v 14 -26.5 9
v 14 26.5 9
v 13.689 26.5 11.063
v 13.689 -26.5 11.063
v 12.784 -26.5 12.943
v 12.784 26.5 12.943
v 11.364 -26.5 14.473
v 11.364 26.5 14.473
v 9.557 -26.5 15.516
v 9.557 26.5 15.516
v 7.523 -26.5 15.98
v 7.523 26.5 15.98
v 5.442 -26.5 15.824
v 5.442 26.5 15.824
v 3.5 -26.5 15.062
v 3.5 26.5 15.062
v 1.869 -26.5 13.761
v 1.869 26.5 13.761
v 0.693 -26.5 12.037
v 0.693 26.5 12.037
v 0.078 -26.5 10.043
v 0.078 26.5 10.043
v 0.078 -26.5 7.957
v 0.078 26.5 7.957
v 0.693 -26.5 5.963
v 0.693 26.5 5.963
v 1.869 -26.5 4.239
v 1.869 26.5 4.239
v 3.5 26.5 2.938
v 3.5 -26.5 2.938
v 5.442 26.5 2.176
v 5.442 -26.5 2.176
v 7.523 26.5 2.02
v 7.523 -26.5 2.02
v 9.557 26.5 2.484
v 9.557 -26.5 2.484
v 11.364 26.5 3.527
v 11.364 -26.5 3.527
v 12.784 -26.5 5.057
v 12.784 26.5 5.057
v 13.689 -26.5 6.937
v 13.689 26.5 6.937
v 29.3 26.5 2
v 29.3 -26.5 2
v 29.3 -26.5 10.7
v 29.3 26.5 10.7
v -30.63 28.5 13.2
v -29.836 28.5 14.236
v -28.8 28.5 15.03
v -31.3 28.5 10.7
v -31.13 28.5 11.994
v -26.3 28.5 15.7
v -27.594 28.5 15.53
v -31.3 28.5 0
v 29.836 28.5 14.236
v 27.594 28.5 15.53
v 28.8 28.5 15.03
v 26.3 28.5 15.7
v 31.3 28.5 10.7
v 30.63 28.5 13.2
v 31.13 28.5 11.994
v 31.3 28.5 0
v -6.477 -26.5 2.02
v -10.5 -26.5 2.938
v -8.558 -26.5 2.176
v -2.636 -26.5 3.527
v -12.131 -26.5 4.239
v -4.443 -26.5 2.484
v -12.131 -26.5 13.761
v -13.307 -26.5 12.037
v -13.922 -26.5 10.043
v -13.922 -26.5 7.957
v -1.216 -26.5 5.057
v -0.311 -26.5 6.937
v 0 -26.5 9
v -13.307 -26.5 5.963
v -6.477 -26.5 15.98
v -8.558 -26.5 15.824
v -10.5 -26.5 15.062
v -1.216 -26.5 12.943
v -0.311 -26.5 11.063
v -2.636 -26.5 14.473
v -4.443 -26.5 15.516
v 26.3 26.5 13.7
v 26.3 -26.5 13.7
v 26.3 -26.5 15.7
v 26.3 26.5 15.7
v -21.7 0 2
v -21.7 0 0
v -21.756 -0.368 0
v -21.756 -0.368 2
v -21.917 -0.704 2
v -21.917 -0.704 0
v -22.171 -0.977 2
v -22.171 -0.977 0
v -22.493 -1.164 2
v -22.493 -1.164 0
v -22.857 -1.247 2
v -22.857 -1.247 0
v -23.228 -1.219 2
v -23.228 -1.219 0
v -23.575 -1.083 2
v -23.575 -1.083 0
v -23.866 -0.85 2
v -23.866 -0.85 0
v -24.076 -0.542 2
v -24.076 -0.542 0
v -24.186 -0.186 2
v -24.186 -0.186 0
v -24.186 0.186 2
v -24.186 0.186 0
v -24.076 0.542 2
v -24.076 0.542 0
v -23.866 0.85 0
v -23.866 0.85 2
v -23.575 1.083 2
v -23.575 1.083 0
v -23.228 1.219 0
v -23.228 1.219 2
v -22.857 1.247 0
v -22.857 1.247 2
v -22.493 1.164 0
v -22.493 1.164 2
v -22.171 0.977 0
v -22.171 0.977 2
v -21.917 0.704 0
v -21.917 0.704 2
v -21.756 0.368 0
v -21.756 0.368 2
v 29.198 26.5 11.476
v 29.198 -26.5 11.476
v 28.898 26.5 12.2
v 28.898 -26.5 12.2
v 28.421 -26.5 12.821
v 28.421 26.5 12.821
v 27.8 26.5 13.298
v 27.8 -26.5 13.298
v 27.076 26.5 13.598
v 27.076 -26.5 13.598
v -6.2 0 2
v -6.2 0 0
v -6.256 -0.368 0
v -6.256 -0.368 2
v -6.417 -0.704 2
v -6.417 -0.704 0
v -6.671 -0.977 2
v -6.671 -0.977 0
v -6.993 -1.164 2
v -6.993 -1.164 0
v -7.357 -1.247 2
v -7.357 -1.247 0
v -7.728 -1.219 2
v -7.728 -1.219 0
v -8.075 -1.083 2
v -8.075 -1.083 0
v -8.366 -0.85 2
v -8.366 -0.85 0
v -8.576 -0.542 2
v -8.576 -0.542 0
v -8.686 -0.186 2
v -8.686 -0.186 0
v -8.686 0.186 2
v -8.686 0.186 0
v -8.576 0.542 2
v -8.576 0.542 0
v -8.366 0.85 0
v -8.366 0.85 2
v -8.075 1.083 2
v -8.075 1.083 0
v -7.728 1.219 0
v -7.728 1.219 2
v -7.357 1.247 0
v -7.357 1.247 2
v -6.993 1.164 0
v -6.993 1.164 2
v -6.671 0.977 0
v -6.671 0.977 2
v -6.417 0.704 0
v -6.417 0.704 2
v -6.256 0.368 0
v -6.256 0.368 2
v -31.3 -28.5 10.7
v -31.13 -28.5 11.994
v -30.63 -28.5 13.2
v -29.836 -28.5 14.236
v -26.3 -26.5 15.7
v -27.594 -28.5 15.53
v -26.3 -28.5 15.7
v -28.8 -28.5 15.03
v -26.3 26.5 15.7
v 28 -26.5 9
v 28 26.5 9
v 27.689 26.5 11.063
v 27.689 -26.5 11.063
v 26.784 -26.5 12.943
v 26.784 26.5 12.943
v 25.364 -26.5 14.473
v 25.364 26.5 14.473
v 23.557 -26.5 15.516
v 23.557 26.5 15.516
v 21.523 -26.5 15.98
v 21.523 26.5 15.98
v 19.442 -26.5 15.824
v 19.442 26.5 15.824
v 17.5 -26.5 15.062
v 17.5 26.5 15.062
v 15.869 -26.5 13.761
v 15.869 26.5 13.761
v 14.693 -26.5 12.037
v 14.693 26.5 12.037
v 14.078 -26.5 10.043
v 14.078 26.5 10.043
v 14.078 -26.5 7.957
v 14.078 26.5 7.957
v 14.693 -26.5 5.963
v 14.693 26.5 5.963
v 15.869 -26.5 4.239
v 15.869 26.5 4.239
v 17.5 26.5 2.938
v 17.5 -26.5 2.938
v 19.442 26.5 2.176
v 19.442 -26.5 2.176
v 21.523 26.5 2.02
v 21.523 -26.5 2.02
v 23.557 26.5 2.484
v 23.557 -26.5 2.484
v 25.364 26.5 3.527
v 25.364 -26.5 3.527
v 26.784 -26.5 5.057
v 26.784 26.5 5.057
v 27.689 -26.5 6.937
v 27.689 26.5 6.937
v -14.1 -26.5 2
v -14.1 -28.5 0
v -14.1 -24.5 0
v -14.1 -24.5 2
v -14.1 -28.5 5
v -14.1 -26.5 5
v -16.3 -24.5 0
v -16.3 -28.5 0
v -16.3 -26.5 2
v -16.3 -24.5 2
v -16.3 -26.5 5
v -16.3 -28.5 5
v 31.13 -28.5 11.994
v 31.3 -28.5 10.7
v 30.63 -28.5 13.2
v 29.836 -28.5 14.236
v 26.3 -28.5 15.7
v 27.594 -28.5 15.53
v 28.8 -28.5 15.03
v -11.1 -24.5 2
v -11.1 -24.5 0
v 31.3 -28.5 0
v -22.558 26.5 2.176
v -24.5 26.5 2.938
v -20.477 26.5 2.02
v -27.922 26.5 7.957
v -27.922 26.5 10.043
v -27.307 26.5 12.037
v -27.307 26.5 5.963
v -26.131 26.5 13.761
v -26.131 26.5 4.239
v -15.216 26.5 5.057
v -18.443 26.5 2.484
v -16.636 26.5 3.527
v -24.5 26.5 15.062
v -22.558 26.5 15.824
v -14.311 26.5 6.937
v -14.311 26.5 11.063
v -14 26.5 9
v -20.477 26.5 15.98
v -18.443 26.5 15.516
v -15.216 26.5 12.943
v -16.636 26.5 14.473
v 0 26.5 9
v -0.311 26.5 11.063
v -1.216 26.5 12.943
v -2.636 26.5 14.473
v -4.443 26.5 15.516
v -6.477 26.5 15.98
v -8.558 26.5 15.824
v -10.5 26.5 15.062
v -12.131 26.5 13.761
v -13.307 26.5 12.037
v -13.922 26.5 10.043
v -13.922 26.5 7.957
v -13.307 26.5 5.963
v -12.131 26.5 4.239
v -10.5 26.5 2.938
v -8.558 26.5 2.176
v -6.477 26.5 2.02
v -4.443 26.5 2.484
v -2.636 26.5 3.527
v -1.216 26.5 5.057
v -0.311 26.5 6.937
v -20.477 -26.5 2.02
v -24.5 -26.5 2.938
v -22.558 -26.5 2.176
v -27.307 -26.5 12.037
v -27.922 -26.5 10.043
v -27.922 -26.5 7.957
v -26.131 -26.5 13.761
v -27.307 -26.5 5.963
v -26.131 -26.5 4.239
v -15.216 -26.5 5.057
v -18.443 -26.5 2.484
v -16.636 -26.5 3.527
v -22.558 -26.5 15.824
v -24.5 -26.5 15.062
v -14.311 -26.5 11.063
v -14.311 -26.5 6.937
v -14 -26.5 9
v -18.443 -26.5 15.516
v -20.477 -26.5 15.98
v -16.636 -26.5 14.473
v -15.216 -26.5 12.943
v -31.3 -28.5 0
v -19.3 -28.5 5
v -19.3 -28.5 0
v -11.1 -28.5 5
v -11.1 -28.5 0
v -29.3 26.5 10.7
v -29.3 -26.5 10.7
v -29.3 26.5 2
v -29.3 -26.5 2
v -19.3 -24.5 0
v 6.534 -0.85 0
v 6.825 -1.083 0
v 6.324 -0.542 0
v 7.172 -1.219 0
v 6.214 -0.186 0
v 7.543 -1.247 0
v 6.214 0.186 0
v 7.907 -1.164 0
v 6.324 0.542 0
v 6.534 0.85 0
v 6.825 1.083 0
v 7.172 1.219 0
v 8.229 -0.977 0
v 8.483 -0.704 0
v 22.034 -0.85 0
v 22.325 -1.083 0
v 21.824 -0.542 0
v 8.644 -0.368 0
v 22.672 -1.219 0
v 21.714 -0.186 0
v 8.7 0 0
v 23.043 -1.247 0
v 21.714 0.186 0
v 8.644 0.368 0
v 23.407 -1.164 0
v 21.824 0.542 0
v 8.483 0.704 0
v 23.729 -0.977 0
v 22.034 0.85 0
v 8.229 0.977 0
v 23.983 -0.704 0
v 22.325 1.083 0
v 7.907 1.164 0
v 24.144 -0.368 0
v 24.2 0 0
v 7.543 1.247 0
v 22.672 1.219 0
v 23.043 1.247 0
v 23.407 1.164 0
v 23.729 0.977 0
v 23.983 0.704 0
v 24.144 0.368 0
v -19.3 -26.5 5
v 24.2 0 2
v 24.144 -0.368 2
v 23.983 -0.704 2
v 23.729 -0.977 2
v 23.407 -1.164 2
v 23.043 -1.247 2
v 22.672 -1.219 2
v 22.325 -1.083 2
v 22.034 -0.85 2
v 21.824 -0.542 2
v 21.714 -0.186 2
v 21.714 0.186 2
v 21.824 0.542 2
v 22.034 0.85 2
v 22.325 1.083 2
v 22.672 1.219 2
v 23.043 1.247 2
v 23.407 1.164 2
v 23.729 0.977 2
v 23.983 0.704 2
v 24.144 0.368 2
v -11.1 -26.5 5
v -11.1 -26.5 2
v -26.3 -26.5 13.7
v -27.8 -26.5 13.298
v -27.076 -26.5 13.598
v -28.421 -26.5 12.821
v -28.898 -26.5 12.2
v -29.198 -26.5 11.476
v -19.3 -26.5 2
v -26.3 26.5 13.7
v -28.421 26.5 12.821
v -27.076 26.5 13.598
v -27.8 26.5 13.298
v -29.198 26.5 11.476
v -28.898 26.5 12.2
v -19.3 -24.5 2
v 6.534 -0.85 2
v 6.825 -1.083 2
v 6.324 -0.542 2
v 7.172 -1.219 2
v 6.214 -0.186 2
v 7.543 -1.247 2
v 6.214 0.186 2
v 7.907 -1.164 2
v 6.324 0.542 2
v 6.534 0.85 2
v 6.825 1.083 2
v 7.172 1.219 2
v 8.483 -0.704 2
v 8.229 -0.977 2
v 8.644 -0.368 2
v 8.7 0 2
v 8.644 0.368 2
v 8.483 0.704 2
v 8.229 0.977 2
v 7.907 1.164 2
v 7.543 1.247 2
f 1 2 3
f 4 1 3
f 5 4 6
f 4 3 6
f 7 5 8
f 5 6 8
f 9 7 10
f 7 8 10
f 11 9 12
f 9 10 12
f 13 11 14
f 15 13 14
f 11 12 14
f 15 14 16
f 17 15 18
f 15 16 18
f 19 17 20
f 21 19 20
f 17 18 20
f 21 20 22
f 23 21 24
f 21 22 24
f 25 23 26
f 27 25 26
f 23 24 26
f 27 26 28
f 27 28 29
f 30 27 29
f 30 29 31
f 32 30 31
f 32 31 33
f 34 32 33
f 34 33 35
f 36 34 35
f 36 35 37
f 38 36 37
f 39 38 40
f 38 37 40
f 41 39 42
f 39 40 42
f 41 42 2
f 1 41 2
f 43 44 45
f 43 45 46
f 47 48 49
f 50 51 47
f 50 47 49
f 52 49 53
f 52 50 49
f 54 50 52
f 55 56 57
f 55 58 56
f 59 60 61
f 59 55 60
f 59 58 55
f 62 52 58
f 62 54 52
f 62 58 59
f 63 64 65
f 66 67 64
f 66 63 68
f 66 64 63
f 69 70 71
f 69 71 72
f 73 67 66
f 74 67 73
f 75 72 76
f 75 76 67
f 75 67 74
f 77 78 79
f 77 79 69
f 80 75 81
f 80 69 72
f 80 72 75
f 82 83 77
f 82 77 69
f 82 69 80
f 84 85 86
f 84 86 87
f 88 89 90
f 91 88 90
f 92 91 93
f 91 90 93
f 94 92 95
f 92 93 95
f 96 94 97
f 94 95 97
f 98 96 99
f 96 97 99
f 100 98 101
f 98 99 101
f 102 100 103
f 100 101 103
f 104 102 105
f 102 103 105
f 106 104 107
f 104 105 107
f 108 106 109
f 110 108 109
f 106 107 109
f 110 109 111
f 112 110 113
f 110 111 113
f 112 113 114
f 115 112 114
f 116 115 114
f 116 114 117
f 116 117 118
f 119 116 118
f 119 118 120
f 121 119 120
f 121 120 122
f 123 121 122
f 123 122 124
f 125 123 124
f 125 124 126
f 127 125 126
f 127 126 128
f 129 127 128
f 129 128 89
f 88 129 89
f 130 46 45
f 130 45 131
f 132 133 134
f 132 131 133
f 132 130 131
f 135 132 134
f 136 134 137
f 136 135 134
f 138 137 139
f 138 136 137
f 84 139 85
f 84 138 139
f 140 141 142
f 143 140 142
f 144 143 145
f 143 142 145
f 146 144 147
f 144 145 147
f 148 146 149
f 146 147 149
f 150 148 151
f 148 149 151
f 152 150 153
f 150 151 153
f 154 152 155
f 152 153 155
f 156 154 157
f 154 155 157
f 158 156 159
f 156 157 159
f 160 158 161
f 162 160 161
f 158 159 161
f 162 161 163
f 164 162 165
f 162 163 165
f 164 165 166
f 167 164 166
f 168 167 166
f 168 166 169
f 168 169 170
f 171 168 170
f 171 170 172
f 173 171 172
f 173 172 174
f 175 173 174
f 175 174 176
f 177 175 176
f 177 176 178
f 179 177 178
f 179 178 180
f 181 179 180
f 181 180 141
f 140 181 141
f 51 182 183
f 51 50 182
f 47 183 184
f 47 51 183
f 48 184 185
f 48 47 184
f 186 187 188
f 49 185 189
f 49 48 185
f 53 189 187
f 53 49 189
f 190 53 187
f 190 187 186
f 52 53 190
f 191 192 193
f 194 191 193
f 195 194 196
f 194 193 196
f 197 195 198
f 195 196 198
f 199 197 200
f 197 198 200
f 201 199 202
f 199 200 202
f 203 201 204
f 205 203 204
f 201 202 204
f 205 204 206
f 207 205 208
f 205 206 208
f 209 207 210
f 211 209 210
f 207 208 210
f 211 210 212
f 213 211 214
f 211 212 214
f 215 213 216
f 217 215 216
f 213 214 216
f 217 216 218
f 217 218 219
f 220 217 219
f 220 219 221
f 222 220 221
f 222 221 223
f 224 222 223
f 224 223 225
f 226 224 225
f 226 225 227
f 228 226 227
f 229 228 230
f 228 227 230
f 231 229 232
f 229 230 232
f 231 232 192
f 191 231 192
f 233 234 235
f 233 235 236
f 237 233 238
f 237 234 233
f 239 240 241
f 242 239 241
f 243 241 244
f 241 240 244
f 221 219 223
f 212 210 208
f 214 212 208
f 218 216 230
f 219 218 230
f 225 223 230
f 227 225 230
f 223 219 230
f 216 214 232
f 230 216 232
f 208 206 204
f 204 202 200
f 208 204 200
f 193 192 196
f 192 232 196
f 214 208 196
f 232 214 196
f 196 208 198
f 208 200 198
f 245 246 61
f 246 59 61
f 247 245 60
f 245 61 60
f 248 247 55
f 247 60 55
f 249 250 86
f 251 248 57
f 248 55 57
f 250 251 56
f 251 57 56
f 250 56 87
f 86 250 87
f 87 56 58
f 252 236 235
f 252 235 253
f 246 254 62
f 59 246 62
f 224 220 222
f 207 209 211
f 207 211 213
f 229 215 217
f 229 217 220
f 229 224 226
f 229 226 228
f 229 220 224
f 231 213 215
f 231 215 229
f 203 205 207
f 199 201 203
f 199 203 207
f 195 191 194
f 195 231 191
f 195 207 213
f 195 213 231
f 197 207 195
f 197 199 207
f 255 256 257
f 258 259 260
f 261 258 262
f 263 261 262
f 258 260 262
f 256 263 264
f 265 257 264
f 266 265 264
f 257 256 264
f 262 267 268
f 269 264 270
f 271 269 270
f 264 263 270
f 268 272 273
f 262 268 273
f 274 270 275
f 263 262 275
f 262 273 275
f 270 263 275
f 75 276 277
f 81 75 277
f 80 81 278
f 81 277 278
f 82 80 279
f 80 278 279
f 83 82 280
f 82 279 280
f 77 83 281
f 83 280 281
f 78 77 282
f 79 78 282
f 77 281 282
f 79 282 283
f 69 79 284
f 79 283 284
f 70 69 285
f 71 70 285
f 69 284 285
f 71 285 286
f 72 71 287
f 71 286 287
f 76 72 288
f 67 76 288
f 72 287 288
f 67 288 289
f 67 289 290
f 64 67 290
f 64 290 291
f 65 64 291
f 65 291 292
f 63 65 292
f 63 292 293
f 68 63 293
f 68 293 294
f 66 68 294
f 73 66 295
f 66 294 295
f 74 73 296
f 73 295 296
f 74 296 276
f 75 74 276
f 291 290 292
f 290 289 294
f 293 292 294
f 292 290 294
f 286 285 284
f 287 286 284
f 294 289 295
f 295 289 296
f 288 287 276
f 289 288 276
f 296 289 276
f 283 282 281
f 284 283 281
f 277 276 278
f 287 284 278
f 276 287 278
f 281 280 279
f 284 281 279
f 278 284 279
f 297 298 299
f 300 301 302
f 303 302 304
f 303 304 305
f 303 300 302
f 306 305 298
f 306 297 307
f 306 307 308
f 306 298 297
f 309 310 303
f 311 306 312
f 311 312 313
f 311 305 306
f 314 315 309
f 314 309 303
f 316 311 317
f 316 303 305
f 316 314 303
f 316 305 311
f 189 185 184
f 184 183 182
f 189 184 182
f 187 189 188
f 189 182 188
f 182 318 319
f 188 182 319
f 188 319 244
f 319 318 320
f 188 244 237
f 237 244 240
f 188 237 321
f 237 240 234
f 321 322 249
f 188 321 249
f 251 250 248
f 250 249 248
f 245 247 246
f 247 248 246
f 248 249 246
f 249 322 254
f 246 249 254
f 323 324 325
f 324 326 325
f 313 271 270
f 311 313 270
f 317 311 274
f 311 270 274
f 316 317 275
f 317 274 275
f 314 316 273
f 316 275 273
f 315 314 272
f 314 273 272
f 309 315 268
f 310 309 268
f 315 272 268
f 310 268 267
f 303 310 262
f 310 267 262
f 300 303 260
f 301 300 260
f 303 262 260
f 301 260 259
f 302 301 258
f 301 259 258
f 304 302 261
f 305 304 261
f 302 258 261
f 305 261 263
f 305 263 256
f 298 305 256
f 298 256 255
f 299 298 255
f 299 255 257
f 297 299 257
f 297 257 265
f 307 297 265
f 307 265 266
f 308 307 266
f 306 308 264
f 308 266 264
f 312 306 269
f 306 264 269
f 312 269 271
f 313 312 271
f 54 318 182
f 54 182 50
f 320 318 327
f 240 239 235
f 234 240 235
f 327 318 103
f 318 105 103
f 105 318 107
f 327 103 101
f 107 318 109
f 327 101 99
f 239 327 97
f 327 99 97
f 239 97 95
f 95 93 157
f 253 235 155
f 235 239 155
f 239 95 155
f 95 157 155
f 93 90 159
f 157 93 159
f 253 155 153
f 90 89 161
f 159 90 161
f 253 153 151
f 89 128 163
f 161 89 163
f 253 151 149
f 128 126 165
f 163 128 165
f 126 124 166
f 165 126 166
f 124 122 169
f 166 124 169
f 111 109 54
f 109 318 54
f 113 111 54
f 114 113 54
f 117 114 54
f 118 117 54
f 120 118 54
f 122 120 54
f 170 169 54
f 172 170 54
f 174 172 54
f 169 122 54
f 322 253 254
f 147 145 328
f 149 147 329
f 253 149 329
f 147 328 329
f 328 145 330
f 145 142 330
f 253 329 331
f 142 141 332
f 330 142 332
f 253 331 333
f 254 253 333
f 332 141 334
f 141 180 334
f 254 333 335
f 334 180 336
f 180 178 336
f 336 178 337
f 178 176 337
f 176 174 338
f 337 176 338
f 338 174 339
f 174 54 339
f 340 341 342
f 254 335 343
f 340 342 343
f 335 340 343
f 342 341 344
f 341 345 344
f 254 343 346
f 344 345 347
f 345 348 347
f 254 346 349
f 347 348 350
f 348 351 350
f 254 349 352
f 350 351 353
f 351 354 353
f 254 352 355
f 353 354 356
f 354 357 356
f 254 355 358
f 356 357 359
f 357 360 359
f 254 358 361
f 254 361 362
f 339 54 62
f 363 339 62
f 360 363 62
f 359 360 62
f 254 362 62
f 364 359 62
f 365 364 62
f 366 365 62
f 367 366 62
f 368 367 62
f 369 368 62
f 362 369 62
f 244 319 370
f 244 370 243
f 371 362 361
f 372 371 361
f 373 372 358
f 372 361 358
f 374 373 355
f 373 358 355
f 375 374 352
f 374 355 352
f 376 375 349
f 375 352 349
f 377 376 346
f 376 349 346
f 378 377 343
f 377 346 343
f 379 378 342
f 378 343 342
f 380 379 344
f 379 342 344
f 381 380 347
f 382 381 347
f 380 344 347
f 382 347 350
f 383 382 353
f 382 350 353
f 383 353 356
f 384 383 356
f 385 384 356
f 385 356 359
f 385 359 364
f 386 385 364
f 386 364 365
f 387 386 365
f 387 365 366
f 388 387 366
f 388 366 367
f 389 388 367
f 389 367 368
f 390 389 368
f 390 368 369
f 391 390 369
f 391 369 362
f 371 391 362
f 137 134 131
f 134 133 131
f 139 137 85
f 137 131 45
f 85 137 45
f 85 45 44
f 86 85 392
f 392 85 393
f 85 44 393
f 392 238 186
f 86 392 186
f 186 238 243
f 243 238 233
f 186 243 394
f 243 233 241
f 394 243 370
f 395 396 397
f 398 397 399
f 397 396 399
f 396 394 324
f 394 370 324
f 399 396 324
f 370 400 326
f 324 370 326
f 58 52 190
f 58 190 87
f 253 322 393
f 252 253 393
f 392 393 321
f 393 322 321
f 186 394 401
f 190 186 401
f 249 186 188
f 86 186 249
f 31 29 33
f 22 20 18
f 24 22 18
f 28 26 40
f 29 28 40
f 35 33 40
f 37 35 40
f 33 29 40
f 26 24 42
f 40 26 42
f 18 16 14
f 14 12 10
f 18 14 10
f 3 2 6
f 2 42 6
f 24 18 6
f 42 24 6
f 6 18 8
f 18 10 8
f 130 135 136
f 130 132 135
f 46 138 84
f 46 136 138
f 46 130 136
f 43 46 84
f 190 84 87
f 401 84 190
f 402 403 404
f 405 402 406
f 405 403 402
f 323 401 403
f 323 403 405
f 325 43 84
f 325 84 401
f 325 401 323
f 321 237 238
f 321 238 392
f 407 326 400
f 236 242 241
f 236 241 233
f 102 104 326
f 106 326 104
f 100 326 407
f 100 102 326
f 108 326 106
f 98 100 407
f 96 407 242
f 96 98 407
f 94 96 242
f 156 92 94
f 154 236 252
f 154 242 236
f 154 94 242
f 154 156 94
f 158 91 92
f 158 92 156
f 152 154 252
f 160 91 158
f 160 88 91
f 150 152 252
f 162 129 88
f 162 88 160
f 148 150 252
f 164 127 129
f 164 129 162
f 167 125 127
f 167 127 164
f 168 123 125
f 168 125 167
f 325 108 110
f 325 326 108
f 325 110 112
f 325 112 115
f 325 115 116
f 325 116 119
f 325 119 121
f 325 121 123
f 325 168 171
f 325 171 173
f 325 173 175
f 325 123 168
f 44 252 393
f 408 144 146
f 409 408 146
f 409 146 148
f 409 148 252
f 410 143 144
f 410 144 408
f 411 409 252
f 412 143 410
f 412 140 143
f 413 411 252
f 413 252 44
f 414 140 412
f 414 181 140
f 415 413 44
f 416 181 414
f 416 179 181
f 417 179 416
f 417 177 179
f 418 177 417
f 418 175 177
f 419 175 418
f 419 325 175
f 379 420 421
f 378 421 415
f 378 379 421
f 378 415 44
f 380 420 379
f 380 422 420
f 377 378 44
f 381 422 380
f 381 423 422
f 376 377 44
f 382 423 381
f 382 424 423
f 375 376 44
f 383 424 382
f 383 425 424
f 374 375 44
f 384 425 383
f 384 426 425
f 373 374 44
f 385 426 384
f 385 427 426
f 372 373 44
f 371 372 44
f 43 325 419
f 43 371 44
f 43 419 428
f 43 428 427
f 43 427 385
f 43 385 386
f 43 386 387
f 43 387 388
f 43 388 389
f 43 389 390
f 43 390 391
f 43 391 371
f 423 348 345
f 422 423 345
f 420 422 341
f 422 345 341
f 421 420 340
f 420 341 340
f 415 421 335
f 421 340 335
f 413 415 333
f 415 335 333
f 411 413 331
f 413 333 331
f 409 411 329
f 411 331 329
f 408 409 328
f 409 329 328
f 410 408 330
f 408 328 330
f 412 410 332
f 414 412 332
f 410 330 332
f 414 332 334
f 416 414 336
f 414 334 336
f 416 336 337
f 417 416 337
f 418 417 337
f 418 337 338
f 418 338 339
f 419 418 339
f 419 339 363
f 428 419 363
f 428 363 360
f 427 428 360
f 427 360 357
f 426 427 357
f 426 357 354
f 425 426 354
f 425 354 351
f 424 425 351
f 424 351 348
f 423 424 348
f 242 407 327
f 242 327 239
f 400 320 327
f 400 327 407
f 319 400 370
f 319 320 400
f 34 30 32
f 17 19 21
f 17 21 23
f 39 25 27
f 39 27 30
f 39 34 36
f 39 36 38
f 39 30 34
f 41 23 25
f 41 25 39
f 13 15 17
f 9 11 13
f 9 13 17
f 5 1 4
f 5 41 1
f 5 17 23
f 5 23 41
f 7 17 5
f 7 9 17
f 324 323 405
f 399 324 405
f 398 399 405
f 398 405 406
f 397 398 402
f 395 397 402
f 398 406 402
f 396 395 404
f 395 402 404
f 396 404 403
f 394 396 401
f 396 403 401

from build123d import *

# Parameters (mm, degrees)
F0_W     = 62.6
F0_H     = 57
F1_DEPTH = 15.7
F2_R     = 5
F3_T     = -2
F4_W     = 3
F4_H     = 5
F5_DEPTH = 4
F6_R     = 1.25
F7_DEPTH = 25
F9_DEPTH = 53
F8_R     = 7


# Not quite as in the source:
# - a shell that OpenCascade refuses in one call is made with other operations: the cavity is built on its own and cut out


with BuildPart() as f1:
    # F0 (on Top) → F1 (new body)
    with BuildSketch(Plane.XY):
        Rectangle(F0_W, F0_H)
    extrude(amount=F1_DEPTH)

    # F2
    f2_edges = [f1.edges().sort_by_distance(p)[0] for p in [
        (-31.3, 0, 15.7),
        (31.3, 0, 15.7),
    ]]
    fillet(f2_edges, radius=F2_R)

    # F3: a shell. OpenCascade refuses it in one call, so the cavity is built on its own and cut out:
    # the body offset inwards by the wall thickness, plus a prism from it out through each open face.
    f3_core = offset(f1.part, amount=F3_T, mode=Mode.PRIVATE)
    f3_exits = [f3_core.faces().sort_by_distance(p)[0] for p in [
        (0, 0, 13.7),
    ]]
    add(f3_core, mode=Mode.SUBTRACT)
    extrude(f3_exits, amount=-F3_T, mode=Mode.SUBTRACT)

    # F4 (on face) → F5 (cut)
    with BuildSketch(Plane.XZ.offset(28.5)):
        with Locations((-17.8, 2.5)):
            Rectangle(F4_W, F4_H)
        with Locations((-12.6, 2.5)):
            Rectangle(F4_W, F4_H)
    extrude(amount=-F5_DEPTH, mode=Mode.SUBTRACT)

    # F6 (on face) → F7 (cut)
    with BuildSketch(Plane(origin=(0, 0, 0), x_dir=(1, 0, 0), z_dir=(0, 0, -1))):
        with Locations((-22.95, 0)):
            Circle(F6_R)
        with Locations((22.95, 0)):
            Circle(F6_R)
        with Locations((-7.45, 0)):
            Circle(F6_R)
        with Locations((7.45, 0)):
            Circle(F6_R)
    extrude(amount=-F7_DEPTH, mode=Mode.SUBTRACT)


with BuildPart() as f9:
    # F8 (on face) → F9 (new body, through all)
    with BuildSketch(Plane.XZ.offset(-26.5)):
        with BuildLine():
            ThreePointArc((14, 9), (21, 2), (28, 9))
            ThreePointArc((28, 9), (21, 16), (14, 9))
        make_face()
    extrude(amount=F9_DEPTH)


with BuildPart() as f9b:
    # F8 (on face) → F9, piece 2 (new body, through all)
    with BuildSketch(Plane.XZ.offset(-26.5)):
        with Locations((-21, 9)):
            Circle(F8_R)
    extrude(amount=F9_DEPTH)


with BuildPart() as f9c:
    # F8 (on face) → F9, piece 3 (new body, through all)
    with BuildSketch(Plane.XZ.offset(-26.5)):
        with BuildLine():
            ThreePointArc((-14, 9), (-7, 2), (0, 9))
            ThreePointArc((0, 9), (-7, 16), (-14, 9))
        make_face()
    extrude(amount=F9_DEPTH)


with BuildPart() as f9d:
    # F8 (on face) → F9, piece 4 (new body, through all)
    with BuildSketch(Plane.XZ.offset(-26.5)):
        with BuildLine():
            ThreePointArc((0, 9), (7, 2), (14, 9))
            ThreePointArc((14, 9), (7, 16), (0, 9))
        make_face()
    extrude(amount=F9_DEPTH)


solid = Compound([f1.part, f9.part, f9b.part, f9c.part, f9d.part])
